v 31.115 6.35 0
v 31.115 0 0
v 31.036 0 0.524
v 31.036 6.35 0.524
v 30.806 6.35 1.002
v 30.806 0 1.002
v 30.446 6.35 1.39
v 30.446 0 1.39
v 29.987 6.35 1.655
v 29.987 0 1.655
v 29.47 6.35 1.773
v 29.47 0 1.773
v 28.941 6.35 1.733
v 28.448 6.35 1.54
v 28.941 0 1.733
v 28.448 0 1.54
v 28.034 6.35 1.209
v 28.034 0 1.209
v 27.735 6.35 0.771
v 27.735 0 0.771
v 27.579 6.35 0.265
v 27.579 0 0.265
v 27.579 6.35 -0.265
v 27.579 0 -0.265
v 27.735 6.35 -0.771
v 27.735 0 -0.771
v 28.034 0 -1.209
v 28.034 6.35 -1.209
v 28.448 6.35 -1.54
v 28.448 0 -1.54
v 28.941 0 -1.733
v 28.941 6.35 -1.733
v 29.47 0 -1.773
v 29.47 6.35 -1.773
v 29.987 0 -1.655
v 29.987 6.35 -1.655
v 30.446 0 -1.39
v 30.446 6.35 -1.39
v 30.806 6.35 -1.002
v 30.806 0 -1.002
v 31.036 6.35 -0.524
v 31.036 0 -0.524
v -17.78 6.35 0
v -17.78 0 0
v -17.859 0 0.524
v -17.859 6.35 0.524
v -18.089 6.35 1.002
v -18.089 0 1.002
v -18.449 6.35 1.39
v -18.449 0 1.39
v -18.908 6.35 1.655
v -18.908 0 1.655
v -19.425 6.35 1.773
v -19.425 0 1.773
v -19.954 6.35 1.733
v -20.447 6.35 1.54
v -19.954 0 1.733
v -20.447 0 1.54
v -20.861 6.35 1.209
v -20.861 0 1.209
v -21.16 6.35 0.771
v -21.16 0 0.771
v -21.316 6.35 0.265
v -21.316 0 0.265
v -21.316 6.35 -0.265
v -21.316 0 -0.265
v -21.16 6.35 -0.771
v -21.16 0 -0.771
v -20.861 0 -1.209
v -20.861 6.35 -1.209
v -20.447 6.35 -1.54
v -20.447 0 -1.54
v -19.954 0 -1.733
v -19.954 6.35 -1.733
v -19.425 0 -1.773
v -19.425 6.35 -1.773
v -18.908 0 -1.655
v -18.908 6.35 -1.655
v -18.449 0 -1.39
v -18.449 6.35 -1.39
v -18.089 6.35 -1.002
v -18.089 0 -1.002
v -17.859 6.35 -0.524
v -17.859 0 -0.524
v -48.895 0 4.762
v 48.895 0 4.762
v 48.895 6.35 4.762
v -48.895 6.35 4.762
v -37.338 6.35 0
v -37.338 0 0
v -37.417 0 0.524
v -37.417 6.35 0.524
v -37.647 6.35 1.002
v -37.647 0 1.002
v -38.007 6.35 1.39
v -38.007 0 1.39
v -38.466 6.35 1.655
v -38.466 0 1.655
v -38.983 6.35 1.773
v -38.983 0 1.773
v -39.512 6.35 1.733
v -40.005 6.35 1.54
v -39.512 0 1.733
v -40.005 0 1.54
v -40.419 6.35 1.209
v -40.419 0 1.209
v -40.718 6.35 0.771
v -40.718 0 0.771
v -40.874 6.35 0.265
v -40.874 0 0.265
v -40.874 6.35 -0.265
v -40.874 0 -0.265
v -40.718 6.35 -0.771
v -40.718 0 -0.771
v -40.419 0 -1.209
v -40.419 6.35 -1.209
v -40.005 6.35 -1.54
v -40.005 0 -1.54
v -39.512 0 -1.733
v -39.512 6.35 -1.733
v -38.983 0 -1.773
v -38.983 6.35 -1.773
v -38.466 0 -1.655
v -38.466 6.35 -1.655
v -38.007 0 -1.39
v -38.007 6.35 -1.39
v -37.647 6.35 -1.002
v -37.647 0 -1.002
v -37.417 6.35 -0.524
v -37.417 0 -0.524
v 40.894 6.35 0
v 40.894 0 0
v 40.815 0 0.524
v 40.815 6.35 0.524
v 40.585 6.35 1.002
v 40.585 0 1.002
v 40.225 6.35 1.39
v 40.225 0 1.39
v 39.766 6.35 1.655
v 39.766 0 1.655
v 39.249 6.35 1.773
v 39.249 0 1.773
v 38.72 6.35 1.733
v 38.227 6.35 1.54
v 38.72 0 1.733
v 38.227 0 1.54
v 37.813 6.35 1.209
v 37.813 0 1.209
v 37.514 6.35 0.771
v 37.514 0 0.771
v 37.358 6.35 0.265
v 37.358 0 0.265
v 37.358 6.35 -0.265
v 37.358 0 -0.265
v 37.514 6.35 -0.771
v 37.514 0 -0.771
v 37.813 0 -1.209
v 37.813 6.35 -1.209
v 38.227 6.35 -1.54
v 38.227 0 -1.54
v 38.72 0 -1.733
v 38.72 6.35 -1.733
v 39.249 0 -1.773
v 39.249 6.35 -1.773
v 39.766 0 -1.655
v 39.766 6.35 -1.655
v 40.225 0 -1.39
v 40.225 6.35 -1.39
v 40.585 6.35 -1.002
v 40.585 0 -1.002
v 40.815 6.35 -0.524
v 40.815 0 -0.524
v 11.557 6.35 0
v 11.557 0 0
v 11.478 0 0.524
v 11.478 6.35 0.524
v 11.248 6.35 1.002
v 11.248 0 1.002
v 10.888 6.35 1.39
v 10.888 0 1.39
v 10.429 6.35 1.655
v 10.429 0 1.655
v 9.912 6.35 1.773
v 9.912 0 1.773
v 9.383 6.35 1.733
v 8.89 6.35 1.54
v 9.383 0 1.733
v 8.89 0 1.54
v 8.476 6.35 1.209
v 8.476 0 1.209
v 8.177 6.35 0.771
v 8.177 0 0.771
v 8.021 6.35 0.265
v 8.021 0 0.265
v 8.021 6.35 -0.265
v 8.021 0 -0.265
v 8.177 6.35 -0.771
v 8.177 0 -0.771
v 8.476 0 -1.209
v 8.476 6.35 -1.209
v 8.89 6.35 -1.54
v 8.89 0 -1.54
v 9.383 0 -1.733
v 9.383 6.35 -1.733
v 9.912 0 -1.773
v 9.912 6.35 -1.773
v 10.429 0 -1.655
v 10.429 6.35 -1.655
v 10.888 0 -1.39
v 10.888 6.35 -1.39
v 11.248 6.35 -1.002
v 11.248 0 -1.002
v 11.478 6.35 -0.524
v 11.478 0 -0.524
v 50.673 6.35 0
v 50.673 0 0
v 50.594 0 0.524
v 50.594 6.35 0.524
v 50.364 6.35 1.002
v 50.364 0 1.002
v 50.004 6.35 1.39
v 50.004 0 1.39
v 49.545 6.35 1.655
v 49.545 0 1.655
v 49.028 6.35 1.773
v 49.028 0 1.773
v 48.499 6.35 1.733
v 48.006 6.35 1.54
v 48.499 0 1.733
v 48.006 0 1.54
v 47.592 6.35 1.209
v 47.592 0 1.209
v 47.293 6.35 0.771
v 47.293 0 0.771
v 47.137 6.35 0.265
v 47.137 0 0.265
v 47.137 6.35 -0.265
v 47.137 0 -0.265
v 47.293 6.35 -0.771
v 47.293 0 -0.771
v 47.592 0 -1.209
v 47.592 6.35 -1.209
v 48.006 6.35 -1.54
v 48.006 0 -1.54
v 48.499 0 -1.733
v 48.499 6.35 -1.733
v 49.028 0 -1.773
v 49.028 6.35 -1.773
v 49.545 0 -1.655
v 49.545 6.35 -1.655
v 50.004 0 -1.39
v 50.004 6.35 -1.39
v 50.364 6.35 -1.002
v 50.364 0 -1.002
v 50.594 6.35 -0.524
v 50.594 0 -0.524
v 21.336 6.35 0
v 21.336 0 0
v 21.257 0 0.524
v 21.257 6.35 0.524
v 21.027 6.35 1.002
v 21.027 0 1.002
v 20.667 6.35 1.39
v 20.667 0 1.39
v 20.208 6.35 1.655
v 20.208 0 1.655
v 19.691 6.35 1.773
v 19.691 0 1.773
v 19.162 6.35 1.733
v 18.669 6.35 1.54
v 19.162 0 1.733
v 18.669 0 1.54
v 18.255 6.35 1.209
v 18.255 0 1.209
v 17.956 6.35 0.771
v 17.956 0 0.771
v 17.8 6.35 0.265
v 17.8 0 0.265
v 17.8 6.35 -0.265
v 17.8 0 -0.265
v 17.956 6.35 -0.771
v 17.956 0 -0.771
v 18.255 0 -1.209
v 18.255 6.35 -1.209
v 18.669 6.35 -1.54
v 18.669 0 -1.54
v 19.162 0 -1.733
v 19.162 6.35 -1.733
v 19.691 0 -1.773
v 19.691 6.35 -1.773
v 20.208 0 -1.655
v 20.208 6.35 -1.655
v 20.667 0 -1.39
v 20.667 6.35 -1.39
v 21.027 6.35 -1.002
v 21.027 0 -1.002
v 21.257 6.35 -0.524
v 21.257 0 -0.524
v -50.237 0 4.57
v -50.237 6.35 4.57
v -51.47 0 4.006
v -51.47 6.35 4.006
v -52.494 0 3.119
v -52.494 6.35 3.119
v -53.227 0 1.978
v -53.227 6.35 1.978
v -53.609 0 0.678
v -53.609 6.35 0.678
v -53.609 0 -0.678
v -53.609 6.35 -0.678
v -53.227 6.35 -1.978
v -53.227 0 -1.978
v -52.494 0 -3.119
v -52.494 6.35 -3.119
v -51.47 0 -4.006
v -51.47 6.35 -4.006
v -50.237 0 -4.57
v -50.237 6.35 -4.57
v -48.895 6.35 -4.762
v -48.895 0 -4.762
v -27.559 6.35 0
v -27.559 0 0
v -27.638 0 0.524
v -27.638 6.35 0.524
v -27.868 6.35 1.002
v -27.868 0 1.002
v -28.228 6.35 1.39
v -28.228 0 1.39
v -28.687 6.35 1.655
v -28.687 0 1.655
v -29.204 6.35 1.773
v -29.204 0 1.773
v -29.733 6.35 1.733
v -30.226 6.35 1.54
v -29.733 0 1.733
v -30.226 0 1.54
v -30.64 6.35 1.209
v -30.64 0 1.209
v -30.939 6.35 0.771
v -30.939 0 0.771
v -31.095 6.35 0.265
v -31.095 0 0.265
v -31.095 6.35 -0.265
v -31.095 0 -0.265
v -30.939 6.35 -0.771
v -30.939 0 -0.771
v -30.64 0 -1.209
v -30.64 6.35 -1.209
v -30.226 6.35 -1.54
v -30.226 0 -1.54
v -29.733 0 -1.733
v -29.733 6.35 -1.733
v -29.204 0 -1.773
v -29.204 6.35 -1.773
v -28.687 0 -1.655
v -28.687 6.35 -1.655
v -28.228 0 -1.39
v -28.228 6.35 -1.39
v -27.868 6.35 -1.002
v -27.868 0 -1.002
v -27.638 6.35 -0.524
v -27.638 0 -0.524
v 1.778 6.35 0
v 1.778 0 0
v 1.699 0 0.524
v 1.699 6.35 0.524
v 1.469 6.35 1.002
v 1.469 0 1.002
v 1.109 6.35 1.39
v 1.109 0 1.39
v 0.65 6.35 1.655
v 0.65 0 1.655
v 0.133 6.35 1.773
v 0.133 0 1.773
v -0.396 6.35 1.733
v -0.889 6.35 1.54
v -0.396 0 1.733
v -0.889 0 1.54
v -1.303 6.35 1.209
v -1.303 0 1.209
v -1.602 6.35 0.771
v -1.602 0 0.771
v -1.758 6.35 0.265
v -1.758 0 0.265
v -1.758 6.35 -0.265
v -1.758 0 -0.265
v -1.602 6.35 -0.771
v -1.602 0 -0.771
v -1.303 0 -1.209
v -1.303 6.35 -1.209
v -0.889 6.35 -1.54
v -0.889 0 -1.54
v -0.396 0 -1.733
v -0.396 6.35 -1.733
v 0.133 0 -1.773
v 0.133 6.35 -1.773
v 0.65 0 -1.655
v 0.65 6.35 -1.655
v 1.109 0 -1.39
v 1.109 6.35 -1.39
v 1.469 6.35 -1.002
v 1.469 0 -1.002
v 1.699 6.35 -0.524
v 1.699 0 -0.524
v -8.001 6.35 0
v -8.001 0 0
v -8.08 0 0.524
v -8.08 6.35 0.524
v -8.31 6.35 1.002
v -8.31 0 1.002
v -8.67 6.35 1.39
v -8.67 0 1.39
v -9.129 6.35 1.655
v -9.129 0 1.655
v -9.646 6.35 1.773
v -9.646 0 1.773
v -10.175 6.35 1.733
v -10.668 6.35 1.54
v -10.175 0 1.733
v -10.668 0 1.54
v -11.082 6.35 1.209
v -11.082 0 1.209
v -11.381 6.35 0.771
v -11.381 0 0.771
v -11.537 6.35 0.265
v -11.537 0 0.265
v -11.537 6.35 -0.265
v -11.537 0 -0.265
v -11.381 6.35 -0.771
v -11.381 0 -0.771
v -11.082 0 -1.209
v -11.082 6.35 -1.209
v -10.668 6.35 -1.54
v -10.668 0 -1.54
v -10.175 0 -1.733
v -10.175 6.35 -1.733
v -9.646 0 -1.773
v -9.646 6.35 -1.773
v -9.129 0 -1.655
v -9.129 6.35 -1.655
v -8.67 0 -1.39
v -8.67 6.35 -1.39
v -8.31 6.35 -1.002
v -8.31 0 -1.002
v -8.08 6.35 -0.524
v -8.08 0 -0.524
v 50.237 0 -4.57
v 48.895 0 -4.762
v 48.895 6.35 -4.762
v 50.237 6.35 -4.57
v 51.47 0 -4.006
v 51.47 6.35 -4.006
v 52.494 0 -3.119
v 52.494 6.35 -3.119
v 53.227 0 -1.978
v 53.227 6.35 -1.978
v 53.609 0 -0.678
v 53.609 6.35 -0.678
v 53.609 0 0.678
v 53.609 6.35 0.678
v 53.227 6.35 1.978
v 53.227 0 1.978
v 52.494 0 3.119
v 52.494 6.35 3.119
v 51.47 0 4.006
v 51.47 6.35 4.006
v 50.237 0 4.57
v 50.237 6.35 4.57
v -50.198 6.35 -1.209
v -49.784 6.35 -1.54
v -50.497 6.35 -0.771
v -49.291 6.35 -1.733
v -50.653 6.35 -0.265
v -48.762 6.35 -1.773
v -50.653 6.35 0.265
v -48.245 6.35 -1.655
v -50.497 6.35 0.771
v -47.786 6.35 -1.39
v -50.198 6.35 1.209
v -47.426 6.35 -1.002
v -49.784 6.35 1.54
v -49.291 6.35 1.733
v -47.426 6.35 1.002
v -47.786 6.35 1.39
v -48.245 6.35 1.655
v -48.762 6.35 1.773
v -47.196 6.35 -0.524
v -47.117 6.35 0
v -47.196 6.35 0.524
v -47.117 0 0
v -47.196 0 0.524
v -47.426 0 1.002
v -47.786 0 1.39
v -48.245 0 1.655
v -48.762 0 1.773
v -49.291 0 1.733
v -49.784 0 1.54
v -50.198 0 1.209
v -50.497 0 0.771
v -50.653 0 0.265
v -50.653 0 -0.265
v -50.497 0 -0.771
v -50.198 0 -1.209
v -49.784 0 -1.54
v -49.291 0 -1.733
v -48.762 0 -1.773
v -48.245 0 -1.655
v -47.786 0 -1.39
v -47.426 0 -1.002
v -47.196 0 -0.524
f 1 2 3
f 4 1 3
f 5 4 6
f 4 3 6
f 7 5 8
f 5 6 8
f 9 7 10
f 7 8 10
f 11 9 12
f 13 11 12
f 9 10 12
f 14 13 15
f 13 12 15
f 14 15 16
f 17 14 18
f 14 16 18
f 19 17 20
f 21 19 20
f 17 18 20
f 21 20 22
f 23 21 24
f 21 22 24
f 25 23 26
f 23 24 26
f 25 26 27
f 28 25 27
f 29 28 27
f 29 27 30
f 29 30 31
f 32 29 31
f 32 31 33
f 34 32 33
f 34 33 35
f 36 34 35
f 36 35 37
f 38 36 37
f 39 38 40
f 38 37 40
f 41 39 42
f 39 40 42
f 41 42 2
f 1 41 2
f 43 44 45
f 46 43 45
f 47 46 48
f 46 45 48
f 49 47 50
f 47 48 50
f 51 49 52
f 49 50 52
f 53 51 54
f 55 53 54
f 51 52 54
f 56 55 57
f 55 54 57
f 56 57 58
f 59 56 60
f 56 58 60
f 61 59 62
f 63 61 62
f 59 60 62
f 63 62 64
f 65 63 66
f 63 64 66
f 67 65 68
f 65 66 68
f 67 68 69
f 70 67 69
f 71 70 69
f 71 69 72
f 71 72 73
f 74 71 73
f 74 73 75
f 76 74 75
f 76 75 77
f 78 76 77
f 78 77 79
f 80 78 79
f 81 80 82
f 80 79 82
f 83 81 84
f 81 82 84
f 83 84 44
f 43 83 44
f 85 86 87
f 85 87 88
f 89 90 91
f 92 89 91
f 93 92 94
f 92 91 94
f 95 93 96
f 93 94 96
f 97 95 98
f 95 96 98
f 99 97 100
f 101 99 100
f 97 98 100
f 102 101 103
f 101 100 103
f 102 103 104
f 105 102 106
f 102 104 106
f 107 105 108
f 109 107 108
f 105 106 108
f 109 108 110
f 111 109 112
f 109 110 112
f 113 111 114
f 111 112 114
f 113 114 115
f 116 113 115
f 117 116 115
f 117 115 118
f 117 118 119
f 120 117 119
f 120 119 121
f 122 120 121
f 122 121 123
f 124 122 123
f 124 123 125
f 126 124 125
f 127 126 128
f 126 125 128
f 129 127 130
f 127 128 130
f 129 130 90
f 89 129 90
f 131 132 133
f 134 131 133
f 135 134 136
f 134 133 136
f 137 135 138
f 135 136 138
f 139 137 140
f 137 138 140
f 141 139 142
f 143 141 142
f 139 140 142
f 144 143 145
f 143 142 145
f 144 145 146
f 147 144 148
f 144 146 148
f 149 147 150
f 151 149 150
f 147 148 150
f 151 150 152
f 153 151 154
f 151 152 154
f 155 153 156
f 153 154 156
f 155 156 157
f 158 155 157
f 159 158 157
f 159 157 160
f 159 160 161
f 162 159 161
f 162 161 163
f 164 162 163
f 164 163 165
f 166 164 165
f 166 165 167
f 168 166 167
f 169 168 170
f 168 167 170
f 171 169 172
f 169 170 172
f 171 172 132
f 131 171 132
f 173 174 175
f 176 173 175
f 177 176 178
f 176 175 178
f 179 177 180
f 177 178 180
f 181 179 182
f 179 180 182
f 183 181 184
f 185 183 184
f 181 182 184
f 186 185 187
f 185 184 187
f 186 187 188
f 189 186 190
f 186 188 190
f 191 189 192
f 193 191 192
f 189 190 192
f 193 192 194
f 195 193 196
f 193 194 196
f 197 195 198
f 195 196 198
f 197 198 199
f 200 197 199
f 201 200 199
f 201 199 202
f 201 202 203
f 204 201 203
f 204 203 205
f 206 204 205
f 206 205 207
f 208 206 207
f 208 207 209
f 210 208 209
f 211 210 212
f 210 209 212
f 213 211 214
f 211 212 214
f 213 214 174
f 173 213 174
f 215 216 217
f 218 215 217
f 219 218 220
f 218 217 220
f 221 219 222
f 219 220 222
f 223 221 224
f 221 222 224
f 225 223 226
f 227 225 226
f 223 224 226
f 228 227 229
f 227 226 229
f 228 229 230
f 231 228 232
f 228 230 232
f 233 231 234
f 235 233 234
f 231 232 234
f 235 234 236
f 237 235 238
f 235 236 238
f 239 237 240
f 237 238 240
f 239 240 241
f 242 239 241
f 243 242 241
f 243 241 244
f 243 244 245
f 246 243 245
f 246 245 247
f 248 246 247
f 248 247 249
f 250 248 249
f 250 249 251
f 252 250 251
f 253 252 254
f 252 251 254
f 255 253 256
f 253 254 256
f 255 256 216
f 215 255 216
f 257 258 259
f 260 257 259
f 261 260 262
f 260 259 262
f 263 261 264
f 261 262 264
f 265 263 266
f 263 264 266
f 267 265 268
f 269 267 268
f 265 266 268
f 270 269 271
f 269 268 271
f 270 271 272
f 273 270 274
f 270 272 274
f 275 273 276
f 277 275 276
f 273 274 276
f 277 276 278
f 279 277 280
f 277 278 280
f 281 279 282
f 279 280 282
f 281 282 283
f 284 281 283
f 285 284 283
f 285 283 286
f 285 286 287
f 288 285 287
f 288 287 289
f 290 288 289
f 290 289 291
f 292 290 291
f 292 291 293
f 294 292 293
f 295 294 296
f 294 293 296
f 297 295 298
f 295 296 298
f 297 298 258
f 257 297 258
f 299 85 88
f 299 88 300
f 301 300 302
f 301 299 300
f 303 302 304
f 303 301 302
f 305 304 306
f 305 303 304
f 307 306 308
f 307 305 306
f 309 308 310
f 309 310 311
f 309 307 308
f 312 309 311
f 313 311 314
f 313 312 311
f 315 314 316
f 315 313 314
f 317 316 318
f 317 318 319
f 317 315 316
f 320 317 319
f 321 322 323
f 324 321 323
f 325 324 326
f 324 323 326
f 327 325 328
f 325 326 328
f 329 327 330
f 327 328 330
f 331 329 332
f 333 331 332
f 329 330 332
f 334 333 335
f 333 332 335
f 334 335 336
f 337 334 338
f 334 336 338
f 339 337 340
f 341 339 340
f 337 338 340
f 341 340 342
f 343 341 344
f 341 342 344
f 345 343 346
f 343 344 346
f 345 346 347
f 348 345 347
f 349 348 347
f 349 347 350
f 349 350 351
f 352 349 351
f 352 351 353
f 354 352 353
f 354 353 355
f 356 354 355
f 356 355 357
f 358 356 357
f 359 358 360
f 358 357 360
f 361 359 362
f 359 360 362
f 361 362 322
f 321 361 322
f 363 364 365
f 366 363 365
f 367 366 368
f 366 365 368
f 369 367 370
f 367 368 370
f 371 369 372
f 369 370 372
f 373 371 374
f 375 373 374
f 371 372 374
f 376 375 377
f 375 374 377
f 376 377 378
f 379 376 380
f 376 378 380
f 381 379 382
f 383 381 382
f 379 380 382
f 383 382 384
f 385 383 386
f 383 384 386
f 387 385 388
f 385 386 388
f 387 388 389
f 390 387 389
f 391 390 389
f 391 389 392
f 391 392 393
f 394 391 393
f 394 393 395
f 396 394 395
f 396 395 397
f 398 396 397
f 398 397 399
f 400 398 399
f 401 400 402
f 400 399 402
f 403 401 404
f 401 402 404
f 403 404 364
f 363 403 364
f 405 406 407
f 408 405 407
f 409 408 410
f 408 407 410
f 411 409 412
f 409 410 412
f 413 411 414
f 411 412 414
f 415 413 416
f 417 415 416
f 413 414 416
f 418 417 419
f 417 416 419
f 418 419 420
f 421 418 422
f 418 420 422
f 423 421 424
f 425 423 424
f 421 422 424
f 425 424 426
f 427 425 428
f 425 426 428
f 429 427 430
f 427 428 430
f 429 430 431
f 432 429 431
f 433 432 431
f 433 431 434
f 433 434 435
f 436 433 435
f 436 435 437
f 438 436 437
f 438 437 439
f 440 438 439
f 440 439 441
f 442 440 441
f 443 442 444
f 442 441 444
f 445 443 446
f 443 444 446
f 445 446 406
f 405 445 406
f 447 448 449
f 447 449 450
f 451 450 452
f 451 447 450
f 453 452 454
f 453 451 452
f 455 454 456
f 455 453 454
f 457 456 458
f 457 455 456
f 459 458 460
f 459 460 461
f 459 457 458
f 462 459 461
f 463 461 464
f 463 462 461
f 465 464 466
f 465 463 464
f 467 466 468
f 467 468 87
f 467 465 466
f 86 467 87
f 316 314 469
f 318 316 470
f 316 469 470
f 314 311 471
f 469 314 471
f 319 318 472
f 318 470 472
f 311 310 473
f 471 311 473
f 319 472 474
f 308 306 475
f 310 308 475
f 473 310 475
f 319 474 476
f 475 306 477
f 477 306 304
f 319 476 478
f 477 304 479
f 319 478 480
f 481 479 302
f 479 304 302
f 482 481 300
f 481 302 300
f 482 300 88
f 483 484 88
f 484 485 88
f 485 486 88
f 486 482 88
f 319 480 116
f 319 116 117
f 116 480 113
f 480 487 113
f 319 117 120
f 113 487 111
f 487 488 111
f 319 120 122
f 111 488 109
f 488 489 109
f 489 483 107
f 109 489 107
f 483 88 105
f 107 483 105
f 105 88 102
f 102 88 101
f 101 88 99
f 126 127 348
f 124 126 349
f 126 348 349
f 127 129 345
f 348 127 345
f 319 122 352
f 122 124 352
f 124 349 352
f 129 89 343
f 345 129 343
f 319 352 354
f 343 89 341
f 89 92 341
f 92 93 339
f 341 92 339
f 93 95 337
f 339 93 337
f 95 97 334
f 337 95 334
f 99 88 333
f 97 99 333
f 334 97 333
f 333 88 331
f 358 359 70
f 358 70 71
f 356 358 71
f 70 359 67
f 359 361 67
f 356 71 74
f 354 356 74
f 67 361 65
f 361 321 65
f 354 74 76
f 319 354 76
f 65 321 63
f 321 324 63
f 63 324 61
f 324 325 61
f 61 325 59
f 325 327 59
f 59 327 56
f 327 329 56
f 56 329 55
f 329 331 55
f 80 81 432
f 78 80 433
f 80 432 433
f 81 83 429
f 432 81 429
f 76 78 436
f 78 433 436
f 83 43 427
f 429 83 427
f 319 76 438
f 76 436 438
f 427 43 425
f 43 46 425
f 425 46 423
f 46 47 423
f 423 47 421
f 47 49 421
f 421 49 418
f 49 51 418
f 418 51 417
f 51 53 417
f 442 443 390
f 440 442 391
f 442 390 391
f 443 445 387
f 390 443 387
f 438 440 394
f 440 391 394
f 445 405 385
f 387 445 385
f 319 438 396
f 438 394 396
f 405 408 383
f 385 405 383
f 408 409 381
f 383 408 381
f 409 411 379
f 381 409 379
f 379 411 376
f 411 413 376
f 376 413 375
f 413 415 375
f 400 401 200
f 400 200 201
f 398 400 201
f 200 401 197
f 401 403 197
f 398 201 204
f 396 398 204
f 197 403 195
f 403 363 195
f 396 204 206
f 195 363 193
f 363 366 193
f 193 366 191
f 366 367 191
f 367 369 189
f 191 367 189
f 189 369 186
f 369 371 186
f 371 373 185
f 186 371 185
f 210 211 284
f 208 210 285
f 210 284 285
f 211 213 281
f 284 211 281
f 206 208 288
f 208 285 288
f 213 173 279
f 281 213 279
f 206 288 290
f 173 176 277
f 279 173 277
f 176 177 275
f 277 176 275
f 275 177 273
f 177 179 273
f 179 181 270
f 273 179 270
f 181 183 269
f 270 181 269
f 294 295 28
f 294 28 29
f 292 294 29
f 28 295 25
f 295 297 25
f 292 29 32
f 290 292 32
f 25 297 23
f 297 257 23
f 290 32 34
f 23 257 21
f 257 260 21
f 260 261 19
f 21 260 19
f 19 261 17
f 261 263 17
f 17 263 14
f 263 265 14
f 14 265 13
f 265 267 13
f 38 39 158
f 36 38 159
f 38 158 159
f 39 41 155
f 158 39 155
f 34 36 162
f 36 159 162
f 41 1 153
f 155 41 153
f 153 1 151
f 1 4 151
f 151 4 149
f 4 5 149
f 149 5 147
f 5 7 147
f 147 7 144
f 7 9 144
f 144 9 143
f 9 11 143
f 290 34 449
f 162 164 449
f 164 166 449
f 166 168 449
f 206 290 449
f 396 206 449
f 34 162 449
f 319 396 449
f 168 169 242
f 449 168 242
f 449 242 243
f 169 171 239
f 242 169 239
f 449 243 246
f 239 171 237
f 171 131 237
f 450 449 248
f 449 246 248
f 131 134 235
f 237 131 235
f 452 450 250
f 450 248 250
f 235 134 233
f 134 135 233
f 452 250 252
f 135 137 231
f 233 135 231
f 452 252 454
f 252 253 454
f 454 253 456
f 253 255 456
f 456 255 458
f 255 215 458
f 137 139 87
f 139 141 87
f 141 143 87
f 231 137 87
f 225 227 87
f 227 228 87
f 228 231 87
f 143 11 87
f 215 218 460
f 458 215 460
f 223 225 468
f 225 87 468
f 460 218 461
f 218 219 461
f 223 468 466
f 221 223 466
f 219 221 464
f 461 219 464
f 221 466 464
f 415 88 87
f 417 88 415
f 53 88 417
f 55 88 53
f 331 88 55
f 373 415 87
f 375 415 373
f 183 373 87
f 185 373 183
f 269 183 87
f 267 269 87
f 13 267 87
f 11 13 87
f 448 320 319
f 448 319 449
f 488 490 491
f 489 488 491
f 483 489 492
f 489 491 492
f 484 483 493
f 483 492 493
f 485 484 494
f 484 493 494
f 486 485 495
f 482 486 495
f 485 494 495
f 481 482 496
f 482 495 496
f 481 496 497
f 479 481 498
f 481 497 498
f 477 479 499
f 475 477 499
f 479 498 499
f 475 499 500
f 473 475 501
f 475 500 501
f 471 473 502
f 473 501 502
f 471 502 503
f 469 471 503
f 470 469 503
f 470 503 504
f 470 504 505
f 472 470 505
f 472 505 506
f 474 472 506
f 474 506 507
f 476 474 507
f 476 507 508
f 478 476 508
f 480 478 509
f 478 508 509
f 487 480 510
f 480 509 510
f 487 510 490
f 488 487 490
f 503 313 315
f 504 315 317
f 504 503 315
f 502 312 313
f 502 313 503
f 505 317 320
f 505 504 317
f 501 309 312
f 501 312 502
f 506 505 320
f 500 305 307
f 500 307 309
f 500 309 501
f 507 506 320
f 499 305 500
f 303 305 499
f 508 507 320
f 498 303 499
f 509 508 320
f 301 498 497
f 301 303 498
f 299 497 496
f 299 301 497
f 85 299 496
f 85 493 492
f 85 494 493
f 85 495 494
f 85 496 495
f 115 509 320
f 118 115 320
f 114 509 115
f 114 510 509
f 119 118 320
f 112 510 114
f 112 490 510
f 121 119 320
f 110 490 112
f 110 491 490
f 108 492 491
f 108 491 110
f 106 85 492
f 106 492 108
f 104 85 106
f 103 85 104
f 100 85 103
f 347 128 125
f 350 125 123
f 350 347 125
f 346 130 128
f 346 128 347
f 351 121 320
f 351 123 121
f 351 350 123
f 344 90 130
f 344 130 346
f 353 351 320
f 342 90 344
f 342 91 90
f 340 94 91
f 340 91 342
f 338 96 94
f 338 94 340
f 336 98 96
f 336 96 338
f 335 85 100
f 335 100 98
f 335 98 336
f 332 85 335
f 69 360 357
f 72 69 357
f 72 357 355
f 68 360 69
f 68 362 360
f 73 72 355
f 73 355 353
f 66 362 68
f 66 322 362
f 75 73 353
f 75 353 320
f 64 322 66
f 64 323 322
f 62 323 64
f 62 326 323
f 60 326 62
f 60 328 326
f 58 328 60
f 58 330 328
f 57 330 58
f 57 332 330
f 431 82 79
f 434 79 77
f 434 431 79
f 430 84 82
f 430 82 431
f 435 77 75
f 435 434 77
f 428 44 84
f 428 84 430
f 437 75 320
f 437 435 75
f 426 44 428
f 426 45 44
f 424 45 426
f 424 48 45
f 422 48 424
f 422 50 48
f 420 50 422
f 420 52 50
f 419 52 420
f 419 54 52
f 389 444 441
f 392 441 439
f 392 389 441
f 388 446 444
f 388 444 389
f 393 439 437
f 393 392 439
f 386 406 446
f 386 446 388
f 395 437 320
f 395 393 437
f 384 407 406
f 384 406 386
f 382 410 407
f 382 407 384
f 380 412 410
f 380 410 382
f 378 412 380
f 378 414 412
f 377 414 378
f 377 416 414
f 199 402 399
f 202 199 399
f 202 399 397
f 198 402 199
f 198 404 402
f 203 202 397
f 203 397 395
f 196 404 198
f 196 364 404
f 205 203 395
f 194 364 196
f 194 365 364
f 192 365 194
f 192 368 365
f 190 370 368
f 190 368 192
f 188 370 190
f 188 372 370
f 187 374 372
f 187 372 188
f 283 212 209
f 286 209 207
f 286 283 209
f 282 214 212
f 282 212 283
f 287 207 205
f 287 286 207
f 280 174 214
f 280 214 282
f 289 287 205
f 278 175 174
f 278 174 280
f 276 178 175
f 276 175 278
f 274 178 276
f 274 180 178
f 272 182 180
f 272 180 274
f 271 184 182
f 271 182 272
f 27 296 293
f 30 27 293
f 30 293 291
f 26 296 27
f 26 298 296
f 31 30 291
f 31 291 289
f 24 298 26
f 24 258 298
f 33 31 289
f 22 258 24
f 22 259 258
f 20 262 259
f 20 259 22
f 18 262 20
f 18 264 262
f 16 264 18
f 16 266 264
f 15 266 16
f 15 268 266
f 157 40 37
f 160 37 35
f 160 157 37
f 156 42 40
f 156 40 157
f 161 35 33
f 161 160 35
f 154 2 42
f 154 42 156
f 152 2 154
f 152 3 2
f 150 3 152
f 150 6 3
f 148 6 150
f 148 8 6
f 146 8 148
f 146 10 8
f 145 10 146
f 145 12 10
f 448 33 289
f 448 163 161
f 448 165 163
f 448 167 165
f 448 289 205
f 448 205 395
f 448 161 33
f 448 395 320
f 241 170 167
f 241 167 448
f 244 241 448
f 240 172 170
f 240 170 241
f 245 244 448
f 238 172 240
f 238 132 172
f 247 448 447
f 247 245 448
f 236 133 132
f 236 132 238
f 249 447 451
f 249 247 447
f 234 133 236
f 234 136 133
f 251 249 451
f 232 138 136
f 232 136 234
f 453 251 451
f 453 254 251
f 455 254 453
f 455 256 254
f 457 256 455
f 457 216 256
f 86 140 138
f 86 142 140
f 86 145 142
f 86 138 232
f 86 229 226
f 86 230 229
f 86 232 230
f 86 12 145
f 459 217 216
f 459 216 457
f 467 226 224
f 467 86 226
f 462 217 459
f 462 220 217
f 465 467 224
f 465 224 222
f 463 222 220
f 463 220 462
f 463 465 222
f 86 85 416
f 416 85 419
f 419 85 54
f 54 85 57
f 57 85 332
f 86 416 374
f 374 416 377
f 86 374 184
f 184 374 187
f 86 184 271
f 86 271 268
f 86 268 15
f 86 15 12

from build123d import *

# Parameters (mm, degrees)
SKETCH1_R           = 1.778
BOSS_EXTRUDE1_DEPTH = 6.35


with BuildPart() as part:
    # Sketch1 → Boss-Extrude1 (new body)
    with BuildSketch(Plane.XZ):
        with BuildLine():
            Line((-48.895, -4.7625), (48.895, -4.7625))
            ThreePointArc((48.895, -4.7625), (53.6575, 0), (48.895, 4.7625))
            Line((48.895, 4.7625), (-48.895, 4.7625))
            ThreePointArc((-48.895, 4.7625), (-53.6575, 0), (-48.895, -4.7625))
        make_face()
        with Locations((48.895, 0)):
            Circle(SKETCH1_R, mode=Mode.SUBTRACT)
        with Locations((39.116, 0)):
            Circle(SKETCH1_R, mode=Mode.SUBTRACT)
        with Locations((29.337, 0)):
            Circle(SKETCH1_R, mode=Mode.SUBTRACT)
        with Locations((19.558, 0)):
            Circle(SKETCH1_R, mode=Mode.SUBTRACT)
        with Locations((9.779, 0)):
            Circle(SKETCH1_R, mode=Mode.SUBTRACT)
        Circle(SKETCH1_R, mode=Mode.SUBTRACT)
        with Locations((-9.779, 0)):
            Circle(SKETCH1_R, mode=Mode.SUBTRACT)
        with Locations((-19.558, 0)):
            Circle(SKETCH1_R, mode=Mode.SUBTRACT)
        with Locations((-29.337, 0)):
            Circle(SKETCH1_R, mode=Mode.SUBTRACT)
        with Locations((-39.116, 0)):
            Circle(SKETCH1_R, mode=Mode.SUBTRACT)
        with Locations((-48.895, 0)):
            Circle(SKETCH1_R, mode=Mode.SUBTRACT)
    extrude(amount=-BOSS_EXTRUDE1_DEPTH)


solid = part.part
